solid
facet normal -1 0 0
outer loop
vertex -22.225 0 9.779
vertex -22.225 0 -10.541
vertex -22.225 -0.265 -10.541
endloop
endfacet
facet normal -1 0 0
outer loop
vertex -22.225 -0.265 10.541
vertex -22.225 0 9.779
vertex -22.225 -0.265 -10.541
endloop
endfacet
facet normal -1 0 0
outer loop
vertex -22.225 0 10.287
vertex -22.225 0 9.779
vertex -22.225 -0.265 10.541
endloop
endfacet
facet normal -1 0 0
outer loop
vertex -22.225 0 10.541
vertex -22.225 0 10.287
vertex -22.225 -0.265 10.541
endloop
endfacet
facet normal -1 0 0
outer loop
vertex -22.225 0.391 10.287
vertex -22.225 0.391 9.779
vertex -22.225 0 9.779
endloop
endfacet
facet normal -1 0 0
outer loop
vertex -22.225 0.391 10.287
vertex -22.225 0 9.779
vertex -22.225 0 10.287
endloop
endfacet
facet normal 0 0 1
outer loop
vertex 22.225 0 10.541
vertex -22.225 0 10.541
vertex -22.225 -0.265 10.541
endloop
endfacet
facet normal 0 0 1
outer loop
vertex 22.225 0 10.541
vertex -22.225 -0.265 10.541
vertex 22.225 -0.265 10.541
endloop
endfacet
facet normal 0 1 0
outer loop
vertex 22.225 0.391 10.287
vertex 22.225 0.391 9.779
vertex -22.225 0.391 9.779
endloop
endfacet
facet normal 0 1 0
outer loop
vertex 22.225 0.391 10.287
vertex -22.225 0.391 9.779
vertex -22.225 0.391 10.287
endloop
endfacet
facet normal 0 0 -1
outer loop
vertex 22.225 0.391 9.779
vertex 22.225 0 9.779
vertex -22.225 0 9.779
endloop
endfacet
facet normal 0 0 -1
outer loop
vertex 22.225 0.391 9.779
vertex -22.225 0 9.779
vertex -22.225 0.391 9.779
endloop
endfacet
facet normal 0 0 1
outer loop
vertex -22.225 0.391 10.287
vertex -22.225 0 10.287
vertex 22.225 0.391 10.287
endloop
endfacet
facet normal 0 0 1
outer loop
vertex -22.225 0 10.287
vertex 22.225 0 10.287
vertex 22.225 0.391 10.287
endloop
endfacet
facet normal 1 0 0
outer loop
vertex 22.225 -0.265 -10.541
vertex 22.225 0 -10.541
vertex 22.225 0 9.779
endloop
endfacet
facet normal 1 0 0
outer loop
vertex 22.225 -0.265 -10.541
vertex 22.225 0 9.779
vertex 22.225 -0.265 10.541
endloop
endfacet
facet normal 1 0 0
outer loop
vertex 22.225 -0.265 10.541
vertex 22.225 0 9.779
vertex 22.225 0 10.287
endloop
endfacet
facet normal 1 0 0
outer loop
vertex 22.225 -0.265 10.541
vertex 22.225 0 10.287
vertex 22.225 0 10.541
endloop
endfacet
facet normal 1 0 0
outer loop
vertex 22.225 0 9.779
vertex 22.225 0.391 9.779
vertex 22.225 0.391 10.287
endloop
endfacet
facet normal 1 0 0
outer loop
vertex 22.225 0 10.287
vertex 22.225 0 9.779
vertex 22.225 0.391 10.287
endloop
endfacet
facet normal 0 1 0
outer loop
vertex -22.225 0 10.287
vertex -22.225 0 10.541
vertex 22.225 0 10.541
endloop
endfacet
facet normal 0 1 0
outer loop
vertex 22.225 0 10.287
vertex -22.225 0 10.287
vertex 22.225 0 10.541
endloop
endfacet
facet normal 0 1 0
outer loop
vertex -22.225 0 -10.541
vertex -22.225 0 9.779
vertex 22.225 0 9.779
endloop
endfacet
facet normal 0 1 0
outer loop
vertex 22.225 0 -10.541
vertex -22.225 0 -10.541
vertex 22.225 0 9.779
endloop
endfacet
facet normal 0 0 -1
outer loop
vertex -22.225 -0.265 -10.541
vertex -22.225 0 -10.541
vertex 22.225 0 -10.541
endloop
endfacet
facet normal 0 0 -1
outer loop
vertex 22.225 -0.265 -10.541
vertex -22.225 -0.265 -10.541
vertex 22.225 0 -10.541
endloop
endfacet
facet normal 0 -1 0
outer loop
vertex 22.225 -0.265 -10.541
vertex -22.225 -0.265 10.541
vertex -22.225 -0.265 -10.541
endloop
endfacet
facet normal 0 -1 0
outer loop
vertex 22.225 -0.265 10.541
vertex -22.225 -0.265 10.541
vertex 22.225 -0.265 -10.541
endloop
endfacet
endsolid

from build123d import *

# Parameters (mm, degrees)
F0_W     = 44.45
F0_H     = 21.082
F1_DEPTH = 0.2645833334
F2_W     = 0.3908552
F2_H     = 0.508
F3_DEPTH = 22.225


with BuildPart() as f1:
    # F0 (on Front) → F1 (new body)
    with BuildSketch(Plane.XZ):
        Rectangle(F0_W, F0_H)
    extrude(amount=F1_DEPTH)

    # F2 (on Right) → F3 (join, symmetric)
    with BuildSketch(Plane.YZ):
        with Locations((0.1954276, 10.033)):
            Rectangle(F2_W, F2_H)
    extrude(amount=F3_DEPTH, both=True)


solid = f1.part
